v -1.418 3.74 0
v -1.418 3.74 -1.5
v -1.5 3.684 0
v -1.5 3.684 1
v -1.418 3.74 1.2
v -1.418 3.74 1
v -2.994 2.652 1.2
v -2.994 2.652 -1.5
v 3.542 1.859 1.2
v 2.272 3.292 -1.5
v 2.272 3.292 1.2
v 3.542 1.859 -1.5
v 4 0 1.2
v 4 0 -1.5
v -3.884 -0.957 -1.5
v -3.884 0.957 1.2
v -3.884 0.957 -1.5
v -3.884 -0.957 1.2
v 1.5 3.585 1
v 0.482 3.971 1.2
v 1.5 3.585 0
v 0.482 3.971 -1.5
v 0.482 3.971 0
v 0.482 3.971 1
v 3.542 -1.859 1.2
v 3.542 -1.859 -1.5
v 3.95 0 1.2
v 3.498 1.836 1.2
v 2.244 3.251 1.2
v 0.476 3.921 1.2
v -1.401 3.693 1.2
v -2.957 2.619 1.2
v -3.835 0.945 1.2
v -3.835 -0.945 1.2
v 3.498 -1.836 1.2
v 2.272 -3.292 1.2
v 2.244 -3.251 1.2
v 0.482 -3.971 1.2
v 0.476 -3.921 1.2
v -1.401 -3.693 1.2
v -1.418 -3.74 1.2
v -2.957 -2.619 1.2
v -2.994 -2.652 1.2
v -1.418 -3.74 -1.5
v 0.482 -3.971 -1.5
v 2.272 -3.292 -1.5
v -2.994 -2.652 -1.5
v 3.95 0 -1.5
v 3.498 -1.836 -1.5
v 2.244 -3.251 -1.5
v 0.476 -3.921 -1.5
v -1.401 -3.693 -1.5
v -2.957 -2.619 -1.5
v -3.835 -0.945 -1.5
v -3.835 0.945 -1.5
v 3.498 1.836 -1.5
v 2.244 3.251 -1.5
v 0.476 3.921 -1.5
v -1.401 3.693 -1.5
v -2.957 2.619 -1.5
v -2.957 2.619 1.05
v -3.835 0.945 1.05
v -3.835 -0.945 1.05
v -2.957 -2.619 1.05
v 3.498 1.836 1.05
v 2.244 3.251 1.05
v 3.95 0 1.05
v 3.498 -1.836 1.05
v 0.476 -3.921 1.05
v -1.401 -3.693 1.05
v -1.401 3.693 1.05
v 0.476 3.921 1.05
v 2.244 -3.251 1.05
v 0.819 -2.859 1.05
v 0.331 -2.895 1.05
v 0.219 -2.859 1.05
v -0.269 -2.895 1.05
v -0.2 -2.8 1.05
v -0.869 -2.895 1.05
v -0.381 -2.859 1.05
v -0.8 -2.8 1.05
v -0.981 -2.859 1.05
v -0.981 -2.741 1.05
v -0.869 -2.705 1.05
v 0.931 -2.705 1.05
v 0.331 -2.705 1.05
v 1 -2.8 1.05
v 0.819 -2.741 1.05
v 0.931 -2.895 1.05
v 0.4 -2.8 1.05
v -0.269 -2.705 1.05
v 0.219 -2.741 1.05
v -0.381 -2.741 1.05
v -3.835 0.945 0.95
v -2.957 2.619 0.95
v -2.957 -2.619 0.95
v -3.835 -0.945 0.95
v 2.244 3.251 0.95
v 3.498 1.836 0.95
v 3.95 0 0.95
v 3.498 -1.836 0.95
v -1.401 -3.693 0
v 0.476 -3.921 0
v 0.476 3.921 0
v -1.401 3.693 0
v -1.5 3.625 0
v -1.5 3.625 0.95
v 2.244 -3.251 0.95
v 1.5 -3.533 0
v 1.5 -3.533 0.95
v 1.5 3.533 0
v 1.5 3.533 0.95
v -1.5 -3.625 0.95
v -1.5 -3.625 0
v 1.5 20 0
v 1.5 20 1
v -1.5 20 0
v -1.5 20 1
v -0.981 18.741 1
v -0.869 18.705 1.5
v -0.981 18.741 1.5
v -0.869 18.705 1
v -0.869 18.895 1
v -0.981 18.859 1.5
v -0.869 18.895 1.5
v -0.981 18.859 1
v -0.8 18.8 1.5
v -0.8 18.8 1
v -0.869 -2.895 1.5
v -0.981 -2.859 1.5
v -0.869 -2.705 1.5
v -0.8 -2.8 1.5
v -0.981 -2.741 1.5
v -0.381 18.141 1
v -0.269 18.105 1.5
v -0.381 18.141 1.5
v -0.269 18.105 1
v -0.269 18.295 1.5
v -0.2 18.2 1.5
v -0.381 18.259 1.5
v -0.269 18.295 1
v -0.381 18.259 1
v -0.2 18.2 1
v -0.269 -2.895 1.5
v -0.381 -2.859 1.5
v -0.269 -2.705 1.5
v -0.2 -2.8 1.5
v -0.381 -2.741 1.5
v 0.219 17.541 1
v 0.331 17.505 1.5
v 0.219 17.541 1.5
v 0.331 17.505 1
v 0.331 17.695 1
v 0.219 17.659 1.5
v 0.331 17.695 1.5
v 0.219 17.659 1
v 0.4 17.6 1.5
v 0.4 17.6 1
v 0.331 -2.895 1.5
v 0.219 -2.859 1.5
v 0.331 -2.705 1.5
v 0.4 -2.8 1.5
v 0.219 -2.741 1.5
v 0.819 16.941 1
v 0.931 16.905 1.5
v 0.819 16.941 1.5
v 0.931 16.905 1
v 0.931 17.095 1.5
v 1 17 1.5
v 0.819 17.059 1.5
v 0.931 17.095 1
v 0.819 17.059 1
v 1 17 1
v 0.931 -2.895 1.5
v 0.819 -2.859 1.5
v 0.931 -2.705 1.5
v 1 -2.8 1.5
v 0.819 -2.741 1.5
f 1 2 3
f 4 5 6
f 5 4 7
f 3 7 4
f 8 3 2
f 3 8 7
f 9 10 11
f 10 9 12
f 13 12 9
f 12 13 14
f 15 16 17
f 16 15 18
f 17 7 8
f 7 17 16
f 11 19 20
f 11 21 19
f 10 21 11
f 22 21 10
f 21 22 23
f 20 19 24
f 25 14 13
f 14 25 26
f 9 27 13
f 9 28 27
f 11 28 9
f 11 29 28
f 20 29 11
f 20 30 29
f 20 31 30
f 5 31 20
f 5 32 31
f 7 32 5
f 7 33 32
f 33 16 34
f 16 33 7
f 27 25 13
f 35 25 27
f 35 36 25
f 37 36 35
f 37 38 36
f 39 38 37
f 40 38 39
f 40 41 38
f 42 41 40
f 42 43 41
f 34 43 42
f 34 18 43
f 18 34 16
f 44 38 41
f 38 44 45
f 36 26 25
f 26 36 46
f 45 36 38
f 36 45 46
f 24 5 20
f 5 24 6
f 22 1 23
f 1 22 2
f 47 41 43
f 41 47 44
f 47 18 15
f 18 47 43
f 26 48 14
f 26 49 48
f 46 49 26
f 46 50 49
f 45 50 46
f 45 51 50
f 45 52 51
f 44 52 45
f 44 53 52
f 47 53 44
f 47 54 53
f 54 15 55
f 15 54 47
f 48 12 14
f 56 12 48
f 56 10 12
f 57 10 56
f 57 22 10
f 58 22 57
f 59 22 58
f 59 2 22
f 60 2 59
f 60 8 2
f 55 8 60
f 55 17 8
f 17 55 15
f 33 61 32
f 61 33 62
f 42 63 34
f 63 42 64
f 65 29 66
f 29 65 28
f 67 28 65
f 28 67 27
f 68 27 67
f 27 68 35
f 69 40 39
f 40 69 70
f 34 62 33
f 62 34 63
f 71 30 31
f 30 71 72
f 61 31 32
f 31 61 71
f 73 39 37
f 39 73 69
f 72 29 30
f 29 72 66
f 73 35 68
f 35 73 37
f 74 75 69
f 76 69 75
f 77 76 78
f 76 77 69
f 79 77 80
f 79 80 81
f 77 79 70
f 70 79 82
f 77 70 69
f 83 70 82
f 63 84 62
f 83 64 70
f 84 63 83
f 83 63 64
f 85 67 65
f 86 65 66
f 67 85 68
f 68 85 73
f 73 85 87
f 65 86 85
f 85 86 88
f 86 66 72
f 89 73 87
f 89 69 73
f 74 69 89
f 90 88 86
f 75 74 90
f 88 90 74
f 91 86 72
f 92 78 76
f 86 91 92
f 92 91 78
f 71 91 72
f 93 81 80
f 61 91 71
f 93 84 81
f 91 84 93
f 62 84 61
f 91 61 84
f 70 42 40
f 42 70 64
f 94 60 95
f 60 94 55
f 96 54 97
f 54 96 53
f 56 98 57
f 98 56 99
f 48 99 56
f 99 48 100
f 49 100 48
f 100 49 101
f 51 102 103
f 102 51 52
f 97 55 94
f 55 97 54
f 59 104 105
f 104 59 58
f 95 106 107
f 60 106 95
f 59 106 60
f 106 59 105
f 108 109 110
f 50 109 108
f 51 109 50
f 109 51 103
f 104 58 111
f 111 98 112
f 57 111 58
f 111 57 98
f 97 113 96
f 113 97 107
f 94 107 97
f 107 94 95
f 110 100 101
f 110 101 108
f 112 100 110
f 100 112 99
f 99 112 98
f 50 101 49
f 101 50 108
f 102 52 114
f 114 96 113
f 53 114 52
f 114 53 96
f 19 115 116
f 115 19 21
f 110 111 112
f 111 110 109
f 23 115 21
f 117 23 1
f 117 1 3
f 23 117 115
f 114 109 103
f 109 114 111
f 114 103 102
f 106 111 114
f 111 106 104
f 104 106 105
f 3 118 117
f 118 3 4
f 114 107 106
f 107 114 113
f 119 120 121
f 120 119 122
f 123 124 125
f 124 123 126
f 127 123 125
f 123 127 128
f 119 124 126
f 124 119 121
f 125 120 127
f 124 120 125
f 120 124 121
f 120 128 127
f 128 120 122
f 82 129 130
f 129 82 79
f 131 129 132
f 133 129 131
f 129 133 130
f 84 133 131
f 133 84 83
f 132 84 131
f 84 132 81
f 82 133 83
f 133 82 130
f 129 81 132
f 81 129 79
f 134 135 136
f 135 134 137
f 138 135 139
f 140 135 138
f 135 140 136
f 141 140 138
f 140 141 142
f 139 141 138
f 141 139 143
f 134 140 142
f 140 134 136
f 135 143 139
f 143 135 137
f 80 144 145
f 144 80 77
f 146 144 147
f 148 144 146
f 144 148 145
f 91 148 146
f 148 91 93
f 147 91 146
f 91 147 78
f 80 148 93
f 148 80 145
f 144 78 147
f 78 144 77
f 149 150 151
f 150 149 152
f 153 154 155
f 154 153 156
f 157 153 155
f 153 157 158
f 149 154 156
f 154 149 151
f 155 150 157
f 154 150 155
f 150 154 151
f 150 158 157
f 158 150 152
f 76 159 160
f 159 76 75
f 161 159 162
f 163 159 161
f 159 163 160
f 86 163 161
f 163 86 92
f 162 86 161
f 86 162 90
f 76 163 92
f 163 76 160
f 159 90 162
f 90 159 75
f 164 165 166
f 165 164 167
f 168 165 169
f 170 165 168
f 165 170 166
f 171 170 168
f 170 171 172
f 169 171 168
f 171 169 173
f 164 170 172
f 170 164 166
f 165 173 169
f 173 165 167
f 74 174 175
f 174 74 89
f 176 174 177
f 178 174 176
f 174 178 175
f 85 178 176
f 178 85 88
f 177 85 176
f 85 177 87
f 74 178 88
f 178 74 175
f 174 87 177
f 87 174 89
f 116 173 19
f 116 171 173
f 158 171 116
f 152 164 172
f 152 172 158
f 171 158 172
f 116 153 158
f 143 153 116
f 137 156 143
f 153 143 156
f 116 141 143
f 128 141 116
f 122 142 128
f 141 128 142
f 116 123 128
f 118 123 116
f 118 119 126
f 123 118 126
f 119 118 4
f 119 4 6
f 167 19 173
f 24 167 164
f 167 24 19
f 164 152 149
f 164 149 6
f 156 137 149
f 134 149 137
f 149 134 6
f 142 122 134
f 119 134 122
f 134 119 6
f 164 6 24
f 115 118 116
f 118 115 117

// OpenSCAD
// edit this stuff

can_radius = 4;
can_height = 2.5;
can_rim_depth = 0.2;
can_thickness = 0.05;

neck_thickness = 1;
neck_width = 3;
neck_length = 20;

pin_count = 4;
pin_length = 1;
pin_radius = 0.1;
pin_offset = 1;







// build can

module can_interior() {
    translate([0, 0, - can_height + neck_thickness - can_thickness])
        cylinder(can_height, can_radius - can_thickness, can_radius - can_thickness);
}
color("gray")
    difference() {
        difference() {
            translate([0, 0, neck_thickness - can_height])
                cylinder(can_height + can_rim_depth, can_radius, can_radius);
            translate([0, 0, neck_thickness + can_thickness])
                cylinder(can_rim_depth, can_radius - can_thickness, can_radius - can_thickness);
        };
        can_interior();
    }
 
    
 // build neck
    
 color("brown")
    translate([neck_width / -2, 0, 0])
        cube([neck_width, neck_length, neck_thickness]);
    intersection() {
        color("brown")
            translate([neck_width / - 2, -can_radius, 0])
                cube([neck_width, can_radius * 2, neck_thickness]);
        color("gray")
            can_interior();
    };


 // build pins
    
 pin_spacing = neck_width / (pin_count + 1);
 for (pin = [1 : pin_count]) {
     
    // pins on neck
    translate([pin_spacing * pin - neck_width / 2, neck_length - pin_spacing * pin * pin_offset - pin_spacing, neck_thickness / 2])
        cylinder(pin_length, pin_radius, pin_radius);
     
    // pins on can
    translate([pin_spacing * pin - neck_width / 2, -(can_radius - pin_spacing * 2), neck_thickness / 2])
        cylinder(pin_length, pin_radius, pin_radius);
 }
